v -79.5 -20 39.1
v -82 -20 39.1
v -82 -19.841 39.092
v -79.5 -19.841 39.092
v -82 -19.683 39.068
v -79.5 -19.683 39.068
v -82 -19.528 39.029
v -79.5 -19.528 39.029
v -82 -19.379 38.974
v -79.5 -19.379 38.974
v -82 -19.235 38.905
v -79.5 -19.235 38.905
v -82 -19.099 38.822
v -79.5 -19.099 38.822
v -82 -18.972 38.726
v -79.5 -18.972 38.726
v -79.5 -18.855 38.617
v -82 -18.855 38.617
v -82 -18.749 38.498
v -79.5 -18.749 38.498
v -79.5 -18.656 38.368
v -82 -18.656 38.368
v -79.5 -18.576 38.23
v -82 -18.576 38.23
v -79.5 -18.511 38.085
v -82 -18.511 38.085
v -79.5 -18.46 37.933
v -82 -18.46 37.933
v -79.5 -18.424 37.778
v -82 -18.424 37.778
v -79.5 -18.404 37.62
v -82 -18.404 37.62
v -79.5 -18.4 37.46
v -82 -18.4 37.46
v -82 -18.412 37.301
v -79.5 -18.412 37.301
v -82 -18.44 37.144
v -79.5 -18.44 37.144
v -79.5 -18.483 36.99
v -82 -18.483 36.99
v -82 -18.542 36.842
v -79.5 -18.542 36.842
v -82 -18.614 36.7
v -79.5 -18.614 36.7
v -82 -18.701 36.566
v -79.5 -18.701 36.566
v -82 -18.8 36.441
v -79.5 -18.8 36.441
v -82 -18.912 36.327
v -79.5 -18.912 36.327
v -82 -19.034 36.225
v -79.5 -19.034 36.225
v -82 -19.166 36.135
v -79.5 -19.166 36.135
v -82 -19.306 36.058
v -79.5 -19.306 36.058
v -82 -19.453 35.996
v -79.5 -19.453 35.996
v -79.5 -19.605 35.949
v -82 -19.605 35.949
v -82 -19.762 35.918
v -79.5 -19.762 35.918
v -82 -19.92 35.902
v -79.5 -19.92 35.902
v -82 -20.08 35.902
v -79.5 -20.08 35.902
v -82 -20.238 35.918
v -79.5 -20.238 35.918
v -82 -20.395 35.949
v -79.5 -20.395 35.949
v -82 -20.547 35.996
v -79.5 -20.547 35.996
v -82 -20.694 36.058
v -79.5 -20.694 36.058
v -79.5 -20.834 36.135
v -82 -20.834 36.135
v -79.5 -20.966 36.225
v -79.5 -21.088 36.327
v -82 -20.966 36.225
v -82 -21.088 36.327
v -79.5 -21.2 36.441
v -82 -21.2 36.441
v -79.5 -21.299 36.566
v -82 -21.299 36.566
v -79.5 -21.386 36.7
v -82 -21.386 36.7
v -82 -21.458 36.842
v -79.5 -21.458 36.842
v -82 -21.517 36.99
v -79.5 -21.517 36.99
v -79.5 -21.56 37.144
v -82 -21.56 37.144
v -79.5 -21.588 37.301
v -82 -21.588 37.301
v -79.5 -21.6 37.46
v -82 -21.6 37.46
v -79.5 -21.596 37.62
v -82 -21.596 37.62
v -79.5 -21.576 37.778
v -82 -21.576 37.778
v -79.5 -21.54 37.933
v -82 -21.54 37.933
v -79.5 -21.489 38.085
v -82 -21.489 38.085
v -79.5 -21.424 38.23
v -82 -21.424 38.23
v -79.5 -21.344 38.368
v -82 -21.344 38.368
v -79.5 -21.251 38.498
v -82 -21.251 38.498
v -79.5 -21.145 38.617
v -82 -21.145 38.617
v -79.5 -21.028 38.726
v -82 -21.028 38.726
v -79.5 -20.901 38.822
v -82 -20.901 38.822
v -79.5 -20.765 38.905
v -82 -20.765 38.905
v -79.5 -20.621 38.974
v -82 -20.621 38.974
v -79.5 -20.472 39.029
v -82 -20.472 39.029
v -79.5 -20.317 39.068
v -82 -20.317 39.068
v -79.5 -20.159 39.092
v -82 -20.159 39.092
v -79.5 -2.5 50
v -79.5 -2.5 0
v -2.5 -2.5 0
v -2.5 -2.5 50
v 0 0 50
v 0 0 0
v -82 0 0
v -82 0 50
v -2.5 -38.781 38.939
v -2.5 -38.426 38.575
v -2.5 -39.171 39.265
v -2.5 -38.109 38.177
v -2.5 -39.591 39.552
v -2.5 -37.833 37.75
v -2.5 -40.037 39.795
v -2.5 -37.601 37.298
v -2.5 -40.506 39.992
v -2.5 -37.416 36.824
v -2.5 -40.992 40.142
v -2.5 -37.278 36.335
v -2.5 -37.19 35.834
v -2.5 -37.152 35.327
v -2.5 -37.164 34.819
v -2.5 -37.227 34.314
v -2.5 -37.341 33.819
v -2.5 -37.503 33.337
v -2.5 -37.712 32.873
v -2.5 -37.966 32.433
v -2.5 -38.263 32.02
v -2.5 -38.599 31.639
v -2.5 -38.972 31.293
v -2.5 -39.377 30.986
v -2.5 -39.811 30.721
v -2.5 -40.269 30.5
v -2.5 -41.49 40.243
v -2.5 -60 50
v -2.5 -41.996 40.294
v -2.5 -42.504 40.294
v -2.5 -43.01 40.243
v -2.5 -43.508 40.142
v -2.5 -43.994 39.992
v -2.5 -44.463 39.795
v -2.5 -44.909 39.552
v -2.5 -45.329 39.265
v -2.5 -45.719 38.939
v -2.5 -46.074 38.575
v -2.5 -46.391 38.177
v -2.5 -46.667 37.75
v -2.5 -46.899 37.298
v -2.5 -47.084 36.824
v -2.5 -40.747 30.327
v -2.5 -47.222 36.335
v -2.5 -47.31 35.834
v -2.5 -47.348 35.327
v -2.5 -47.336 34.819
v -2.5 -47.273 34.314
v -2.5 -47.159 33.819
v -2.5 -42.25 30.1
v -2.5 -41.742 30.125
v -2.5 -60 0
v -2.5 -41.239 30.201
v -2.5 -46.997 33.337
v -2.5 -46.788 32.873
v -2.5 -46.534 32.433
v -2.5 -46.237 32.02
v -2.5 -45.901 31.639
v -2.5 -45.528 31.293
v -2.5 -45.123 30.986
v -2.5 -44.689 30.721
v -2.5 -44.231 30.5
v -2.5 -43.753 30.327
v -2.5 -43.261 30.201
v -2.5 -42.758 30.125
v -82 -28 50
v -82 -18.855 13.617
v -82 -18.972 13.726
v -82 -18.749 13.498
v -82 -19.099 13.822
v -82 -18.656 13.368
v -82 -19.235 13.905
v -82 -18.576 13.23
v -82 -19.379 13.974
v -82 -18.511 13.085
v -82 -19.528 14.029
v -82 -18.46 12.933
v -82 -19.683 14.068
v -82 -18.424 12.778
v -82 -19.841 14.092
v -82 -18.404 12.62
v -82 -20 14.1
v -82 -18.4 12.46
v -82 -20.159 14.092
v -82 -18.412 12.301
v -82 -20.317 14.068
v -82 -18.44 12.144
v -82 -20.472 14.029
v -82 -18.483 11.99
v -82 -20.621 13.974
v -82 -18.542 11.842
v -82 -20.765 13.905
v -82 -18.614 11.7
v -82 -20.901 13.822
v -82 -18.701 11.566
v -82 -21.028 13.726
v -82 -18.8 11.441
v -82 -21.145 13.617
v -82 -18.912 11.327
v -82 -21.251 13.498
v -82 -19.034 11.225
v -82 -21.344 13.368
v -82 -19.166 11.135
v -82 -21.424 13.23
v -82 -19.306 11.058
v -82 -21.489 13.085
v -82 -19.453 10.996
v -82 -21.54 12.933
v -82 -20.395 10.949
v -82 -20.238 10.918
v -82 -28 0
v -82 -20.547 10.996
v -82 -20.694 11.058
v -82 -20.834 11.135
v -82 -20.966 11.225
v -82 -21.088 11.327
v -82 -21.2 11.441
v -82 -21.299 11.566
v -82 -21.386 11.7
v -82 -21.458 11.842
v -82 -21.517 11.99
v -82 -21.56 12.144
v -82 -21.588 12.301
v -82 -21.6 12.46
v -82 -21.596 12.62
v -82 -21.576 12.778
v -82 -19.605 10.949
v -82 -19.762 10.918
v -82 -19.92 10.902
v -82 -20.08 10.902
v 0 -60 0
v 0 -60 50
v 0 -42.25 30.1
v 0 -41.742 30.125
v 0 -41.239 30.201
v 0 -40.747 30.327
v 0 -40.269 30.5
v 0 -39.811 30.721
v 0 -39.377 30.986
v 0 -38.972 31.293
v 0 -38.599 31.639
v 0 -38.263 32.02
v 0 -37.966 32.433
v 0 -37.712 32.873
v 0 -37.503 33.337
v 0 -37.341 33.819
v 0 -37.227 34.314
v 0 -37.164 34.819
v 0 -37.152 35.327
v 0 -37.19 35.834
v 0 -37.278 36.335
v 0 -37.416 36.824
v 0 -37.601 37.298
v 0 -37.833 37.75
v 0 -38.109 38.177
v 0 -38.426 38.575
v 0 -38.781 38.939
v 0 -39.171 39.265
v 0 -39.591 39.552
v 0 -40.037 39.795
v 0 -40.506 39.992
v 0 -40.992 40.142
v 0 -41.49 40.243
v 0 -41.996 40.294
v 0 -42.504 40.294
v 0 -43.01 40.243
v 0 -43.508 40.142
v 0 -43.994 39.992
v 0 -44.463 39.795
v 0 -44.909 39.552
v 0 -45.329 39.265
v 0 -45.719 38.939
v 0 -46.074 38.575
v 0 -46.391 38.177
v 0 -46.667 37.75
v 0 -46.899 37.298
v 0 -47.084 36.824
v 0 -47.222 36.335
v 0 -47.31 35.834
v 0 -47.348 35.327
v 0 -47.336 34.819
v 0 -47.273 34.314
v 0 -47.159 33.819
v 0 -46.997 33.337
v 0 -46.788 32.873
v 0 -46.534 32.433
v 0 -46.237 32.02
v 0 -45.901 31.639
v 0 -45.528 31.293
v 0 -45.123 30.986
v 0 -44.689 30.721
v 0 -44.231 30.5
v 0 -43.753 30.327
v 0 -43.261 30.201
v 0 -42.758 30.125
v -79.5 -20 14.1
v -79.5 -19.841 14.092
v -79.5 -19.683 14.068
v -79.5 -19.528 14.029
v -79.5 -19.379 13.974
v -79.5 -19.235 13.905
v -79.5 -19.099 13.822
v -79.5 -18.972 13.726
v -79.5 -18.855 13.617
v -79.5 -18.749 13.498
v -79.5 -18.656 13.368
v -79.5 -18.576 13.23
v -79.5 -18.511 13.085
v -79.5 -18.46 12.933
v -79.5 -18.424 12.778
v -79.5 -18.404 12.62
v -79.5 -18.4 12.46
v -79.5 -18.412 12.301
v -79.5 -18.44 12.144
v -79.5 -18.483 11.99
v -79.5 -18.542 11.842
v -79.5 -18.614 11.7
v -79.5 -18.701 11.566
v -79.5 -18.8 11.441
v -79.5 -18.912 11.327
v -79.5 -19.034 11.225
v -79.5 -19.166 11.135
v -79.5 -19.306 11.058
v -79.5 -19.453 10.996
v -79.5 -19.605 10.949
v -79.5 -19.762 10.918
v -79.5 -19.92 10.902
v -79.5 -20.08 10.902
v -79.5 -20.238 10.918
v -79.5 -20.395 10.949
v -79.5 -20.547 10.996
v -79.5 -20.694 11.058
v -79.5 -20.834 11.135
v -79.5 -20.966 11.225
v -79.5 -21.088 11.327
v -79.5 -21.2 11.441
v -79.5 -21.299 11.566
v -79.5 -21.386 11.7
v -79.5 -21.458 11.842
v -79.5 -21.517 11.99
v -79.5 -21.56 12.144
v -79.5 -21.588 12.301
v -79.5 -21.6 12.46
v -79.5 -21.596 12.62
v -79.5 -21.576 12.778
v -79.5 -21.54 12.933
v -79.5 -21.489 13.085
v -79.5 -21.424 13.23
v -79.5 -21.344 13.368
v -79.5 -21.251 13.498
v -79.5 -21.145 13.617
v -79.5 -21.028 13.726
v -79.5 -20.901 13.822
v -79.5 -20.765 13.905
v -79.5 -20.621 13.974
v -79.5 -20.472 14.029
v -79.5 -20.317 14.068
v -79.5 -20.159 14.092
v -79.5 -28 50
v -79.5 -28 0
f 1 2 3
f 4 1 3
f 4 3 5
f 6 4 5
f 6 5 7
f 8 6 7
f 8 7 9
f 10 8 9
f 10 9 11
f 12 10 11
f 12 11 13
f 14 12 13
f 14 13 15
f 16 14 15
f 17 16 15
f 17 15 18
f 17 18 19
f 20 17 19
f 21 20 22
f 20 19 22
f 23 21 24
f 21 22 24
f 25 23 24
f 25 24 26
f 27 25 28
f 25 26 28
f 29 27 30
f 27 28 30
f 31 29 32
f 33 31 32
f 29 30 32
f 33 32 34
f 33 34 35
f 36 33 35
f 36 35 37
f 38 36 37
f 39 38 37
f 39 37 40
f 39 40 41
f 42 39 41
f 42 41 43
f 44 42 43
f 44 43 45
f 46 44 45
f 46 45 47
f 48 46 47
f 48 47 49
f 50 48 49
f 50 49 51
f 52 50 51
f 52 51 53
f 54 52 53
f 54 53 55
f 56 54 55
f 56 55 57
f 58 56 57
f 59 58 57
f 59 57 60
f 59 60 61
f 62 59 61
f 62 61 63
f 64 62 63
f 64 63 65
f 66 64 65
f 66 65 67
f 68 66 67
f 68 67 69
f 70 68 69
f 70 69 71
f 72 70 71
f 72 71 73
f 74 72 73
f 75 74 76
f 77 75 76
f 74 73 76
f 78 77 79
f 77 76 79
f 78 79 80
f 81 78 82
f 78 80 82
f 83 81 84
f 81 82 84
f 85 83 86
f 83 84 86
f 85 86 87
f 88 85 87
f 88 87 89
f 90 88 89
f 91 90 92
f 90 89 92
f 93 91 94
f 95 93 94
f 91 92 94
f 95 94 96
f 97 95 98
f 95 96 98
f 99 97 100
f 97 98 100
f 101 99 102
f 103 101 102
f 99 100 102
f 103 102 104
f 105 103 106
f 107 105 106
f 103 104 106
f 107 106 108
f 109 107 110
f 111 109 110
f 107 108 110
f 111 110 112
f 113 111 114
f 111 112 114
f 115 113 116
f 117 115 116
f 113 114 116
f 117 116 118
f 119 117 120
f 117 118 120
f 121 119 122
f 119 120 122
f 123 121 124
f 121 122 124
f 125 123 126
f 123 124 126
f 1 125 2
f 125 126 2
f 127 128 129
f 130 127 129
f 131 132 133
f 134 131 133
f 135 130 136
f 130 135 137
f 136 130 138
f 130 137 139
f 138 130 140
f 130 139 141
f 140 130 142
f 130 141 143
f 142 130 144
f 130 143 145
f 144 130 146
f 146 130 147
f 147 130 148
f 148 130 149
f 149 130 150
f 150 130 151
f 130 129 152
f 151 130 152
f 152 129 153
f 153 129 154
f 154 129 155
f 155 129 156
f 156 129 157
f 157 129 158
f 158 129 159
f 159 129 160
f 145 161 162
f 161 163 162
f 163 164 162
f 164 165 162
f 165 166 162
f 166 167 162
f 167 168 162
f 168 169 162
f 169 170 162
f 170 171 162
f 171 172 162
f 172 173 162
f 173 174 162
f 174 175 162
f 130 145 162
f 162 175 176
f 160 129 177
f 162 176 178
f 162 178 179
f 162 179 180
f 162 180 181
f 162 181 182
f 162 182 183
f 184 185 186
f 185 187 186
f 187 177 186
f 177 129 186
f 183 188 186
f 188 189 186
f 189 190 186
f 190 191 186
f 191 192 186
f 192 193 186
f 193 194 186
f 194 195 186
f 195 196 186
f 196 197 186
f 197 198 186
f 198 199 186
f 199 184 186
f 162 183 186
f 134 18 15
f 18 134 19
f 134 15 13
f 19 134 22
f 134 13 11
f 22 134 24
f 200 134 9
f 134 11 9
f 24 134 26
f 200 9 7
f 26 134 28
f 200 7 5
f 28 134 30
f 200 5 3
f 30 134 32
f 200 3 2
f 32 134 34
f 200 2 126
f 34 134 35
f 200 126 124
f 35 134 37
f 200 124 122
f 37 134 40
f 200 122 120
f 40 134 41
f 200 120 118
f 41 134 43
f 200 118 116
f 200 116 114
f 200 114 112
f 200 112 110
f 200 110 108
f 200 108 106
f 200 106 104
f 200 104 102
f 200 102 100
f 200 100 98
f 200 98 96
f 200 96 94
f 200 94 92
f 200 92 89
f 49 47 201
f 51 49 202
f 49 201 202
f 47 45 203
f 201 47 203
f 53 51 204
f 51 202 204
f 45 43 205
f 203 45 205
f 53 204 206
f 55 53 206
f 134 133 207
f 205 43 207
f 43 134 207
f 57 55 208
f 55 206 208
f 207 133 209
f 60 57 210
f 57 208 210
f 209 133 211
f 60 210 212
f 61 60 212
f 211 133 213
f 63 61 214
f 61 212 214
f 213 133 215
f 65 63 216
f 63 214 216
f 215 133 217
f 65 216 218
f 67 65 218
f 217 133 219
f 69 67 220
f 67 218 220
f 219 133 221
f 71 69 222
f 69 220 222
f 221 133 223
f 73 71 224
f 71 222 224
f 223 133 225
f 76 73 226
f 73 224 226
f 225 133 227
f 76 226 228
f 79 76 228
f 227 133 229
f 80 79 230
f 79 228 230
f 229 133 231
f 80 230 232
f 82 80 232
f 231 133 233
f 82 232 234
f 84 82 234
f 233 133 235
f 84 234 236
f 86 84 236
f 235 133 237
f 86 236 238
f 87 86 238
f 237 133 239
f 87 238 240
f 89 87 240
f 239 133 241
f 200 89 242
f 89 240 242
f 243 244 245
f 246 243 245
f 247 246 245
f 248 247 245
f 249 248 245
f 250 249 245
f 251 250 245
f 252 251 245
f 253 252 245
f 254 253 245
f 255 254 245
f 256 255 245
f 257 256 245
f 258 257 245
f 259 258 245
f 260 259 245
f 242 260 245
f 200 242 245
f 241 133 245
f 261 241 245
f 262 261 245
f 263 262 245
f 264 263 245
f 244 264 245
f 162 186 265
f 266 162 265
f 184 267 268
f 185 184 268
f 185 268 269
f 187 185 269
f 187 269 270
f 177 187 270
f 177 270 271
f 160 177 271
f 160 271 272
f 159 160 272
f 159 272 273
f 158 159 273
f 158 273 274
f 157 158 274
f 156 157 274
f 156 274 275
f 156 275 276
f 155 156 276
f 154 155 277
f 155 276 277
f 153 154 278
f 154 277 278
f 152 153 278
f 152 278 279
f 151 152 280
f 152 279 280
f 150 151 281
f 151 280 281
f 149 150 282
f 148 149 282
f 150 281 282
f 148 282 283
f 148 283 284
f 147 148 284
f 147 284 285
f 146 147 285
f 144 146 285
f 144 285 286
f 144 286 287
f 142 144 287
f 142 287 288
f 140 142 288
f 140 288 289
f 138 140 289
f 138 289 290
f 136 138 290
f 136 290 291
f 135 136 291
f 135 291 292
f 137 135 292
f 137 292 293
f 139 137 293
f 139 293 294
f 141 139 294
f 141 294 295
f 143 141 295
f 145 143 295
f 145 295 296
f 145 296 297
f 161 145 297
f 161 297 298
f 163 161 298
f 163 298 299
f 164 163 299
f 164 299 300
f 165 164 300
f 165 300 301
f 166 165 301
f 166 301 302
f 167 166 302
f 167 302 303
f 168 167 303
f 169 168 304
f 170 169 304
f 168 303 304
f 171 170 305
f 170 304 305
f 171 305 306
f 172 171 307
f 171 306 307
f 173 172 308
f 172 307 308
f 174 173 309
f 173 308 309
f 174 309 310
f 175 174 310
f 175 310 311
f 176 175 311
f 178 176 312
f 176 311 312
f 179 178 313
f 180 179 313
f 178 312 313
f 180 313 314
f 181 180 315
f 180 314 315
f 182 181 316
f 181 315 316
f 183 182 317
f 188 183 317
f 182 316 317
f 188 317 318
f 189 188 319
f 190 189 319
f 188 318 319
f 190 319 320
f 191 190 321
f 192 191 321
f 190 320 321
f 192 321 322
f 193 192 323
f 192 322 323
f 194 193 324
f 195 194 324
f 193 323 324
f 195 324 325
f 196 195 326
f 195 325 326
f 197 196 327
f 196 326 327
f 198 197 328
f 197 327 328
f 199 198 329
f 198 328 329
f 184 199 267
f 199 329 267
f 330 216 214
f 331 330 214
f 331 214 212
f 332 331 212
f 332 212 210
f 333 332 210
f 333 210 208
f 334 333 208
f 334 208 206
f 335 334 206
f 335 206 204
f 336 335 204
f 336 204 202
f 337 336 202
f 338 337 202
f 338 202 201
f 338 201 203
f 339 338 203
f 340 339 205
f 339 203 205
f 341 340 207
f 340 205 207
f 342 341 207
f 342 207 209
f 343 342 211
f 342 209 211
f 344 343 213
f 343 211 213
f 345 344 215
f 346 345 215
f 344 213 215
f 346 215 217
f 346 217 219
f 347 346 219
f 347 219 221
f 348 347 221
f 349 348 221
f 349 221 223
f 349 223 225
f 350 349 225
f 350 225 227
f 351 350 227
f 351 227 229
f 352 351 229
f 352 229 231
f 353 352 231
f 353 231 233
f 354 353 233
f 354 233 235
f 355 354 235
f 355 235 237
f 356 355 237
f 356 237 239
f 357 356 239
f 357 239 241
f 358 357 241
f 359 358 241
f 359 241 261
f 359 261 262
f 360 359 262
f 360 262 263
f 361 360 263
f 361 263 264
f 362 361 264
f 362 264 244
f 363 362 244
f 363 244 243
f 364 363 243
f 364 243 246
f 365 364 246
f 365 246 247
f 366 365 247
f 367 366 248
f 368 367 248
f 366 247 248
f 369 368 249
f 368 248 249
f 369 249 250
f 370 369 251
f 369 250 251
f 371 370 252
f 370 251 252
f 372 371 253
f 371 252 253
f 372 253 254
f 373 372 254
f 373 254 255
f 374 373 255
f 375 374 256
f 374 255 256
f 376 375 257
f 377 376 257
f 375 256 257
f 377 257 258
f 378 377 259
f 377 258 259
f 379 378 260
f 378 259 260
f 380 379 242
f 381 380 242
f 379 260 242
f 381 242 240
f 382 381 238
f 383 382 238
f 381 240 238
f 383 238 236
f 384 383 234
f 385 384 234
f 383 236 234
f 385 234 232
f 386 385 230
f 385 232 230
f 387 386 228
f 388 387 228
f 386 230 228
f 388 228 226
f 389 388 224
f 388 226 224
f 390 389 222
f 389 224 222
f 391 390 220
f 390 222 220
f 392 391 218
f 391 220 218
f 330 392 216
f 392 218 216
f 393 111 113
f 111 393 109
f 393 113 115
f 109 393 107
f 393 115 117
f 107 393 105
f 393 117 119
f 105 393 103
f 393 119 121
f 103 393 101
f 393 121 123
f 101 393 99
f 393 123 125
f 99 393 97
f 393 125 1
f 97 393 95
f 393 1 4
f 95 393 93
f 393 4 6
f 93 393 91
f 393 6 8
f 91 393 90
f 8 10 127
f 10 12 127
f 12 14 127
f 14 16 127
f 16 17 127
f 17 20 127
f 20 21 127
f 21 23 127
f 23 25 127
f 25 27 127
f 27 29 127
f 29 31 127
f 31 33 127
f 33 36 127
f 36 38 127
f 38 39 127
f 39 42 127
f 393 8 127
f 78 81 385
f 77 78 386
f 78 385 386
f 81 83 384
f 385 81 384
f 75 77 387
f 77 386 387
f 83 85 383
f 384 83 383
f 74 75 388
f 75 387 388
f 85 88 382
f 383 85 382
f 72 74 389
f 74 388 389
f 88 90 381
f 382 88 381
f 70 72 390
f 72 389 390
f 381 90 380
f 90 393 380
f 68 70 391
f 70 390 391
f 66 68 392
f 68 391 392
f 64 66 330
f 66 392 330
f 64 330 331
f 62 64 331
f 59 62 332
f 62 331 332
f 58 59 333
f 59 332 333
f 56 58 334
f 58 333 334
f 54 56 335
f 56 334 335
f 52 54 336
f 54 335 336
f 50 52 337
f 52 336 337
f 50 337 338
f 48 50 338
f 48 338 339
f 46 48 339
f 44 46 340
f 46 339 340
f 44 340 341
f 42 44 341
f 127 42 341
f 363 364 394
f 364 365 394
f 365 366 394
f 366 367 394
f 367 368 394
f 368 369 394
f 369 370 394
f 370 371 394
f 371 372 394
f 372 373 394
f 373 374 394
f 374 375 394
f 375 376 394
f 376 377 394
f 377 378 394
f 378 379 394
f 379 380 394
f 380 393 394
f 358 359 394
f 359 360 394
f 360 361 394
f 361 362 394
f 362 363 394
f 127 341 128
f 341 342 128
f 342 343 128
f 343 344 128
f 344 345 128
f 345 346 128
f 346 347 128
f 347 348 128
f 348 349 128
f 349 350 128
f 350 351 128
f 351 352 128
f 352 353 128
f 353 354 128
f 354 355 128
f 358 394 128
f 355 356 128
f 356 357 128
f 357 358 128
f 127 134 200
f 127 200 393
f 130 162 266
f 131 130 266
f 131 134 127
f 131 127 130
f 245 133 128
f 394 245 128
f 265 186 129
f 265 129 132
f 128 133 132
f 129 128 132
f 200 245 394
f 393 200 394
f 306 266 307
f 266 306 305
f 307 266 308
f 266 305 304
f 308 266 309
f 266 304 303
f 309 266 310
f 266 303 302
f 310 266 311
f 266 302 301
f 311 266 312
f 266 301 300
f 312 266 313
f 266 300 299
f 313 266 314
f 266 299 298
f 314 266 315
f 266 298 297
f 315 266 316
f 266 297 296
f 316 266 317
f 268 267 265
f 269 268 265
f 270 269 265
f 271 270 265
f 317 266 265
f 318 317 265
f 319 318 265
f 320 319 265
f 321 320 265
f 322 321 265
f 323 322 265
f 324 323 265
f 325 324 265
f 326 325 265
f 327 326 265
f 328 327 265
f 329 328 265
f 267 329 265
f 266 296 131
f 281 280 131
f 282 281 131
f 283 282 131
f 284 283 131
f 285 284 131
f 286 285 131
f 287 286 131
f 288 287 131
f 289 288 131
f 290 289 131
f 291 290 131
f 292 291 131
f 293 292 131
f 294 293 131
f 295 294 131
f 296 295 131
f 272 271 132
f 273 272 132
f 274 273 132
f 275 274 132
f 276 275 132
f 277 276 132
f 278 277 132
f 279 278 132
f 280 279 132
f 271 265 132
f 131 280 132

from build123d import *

# Parameters (mm, degrees)
BOSS_EXTRUDE1_DEPTH = 50
SKETCH3_R           = 1.6
CUT_EXTRUDE1_DEPTH  = 50
SKETCH4_R           = 5.1
CUT_EXTRUDE2_DEPTH  = 50


with BuildPart() as part:
    # Sketch2 → Boss-Extrude1 (new body)
    with BuildSketch(Plane.XY):
        Polygon((0, 0), (-82, 0), (-82, -28), (-79.5, -28), (-79.5, -2.5), (-2.5, -2.5), (-2.5, -60), (0, -60), align=None)
    extrude(amount=BOSS_EXTRUDE1_DEPTH)

    # Sketch3 → Cut-Extrude1 (cut)
    with BuildSketch(Plane.ZY.offset(82)):
        with Locations((12.5, -20)):
            Circle(SKETCH3_R)
        with Locations((37.5, -20)):
            Circle(SKETCH3_R)
    extrude(amount=-CUT_EXTRUDE1_DEPTH, mode=Mode.SUBTRACT)

    # Sketch4 → Cut-Extrude2 (cut)
    with BuildSketch(Plane(origin=(0, 0, 0), x_dir=(0, 0, -1), z_dir=(1, 0, 0))):
        with Locations((-35.2, -42.25)):
            Circle(SKETCH4_R)
    extrude(amount=-CUT_EXTRUDE2_DEPTH, mode=Mode.SUBTRACT)


solid = part.part
